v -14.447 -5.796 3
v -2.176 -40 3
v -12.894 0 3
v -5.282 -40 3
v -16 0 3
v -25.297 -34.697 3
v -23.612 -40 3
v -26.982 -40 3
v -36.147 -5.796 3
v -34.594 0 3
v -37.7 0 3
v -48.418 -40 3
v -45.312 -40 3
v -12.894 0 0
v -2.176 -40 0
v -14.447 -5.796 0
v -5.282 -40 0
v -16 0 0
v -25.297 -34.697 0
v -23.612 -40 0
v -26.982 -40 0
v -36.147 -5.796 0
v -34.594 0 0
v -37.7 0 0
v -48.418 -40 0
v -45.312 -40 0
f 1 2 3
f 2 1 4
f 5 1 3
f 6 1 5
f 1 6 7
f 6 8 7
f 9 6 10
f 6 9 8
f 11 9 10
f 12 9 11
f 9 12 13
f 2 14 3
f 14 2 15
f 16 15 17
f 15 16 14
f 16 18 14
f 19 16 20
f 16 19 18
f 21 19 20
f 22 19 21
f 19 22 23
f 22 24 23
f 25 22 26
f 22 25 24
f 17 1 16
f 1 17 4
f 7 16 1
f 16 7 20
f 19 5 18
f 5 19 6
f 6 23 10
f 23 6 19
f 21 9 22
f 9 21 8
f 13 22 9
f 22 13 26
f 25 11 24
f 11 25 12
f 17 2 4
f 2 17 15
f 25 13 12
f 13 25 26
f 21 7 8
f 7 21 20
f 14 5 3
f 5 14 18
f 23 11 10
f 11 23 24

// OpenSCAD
//M
  rotate([0,0,-90])
difference(){
union(){
  translate([0,-16,0]) rotate([0,0,15]) cube([43,3,3]);
  translate([0,-16,0]) rotate([0,0,-15]) cube([43,3,3]);

 translate([0,-37.7,0]) rotate([0,0,15]) cube([43,3,3]);

 translate([0,-37.7,0])
  rotate([0,0,-15]) cube([43,3,3]);
}
 translate([40,-60,-1]) cube([5,60,6]);
 translate([-5,-60,-1]) cube([5,60,6]);
}
